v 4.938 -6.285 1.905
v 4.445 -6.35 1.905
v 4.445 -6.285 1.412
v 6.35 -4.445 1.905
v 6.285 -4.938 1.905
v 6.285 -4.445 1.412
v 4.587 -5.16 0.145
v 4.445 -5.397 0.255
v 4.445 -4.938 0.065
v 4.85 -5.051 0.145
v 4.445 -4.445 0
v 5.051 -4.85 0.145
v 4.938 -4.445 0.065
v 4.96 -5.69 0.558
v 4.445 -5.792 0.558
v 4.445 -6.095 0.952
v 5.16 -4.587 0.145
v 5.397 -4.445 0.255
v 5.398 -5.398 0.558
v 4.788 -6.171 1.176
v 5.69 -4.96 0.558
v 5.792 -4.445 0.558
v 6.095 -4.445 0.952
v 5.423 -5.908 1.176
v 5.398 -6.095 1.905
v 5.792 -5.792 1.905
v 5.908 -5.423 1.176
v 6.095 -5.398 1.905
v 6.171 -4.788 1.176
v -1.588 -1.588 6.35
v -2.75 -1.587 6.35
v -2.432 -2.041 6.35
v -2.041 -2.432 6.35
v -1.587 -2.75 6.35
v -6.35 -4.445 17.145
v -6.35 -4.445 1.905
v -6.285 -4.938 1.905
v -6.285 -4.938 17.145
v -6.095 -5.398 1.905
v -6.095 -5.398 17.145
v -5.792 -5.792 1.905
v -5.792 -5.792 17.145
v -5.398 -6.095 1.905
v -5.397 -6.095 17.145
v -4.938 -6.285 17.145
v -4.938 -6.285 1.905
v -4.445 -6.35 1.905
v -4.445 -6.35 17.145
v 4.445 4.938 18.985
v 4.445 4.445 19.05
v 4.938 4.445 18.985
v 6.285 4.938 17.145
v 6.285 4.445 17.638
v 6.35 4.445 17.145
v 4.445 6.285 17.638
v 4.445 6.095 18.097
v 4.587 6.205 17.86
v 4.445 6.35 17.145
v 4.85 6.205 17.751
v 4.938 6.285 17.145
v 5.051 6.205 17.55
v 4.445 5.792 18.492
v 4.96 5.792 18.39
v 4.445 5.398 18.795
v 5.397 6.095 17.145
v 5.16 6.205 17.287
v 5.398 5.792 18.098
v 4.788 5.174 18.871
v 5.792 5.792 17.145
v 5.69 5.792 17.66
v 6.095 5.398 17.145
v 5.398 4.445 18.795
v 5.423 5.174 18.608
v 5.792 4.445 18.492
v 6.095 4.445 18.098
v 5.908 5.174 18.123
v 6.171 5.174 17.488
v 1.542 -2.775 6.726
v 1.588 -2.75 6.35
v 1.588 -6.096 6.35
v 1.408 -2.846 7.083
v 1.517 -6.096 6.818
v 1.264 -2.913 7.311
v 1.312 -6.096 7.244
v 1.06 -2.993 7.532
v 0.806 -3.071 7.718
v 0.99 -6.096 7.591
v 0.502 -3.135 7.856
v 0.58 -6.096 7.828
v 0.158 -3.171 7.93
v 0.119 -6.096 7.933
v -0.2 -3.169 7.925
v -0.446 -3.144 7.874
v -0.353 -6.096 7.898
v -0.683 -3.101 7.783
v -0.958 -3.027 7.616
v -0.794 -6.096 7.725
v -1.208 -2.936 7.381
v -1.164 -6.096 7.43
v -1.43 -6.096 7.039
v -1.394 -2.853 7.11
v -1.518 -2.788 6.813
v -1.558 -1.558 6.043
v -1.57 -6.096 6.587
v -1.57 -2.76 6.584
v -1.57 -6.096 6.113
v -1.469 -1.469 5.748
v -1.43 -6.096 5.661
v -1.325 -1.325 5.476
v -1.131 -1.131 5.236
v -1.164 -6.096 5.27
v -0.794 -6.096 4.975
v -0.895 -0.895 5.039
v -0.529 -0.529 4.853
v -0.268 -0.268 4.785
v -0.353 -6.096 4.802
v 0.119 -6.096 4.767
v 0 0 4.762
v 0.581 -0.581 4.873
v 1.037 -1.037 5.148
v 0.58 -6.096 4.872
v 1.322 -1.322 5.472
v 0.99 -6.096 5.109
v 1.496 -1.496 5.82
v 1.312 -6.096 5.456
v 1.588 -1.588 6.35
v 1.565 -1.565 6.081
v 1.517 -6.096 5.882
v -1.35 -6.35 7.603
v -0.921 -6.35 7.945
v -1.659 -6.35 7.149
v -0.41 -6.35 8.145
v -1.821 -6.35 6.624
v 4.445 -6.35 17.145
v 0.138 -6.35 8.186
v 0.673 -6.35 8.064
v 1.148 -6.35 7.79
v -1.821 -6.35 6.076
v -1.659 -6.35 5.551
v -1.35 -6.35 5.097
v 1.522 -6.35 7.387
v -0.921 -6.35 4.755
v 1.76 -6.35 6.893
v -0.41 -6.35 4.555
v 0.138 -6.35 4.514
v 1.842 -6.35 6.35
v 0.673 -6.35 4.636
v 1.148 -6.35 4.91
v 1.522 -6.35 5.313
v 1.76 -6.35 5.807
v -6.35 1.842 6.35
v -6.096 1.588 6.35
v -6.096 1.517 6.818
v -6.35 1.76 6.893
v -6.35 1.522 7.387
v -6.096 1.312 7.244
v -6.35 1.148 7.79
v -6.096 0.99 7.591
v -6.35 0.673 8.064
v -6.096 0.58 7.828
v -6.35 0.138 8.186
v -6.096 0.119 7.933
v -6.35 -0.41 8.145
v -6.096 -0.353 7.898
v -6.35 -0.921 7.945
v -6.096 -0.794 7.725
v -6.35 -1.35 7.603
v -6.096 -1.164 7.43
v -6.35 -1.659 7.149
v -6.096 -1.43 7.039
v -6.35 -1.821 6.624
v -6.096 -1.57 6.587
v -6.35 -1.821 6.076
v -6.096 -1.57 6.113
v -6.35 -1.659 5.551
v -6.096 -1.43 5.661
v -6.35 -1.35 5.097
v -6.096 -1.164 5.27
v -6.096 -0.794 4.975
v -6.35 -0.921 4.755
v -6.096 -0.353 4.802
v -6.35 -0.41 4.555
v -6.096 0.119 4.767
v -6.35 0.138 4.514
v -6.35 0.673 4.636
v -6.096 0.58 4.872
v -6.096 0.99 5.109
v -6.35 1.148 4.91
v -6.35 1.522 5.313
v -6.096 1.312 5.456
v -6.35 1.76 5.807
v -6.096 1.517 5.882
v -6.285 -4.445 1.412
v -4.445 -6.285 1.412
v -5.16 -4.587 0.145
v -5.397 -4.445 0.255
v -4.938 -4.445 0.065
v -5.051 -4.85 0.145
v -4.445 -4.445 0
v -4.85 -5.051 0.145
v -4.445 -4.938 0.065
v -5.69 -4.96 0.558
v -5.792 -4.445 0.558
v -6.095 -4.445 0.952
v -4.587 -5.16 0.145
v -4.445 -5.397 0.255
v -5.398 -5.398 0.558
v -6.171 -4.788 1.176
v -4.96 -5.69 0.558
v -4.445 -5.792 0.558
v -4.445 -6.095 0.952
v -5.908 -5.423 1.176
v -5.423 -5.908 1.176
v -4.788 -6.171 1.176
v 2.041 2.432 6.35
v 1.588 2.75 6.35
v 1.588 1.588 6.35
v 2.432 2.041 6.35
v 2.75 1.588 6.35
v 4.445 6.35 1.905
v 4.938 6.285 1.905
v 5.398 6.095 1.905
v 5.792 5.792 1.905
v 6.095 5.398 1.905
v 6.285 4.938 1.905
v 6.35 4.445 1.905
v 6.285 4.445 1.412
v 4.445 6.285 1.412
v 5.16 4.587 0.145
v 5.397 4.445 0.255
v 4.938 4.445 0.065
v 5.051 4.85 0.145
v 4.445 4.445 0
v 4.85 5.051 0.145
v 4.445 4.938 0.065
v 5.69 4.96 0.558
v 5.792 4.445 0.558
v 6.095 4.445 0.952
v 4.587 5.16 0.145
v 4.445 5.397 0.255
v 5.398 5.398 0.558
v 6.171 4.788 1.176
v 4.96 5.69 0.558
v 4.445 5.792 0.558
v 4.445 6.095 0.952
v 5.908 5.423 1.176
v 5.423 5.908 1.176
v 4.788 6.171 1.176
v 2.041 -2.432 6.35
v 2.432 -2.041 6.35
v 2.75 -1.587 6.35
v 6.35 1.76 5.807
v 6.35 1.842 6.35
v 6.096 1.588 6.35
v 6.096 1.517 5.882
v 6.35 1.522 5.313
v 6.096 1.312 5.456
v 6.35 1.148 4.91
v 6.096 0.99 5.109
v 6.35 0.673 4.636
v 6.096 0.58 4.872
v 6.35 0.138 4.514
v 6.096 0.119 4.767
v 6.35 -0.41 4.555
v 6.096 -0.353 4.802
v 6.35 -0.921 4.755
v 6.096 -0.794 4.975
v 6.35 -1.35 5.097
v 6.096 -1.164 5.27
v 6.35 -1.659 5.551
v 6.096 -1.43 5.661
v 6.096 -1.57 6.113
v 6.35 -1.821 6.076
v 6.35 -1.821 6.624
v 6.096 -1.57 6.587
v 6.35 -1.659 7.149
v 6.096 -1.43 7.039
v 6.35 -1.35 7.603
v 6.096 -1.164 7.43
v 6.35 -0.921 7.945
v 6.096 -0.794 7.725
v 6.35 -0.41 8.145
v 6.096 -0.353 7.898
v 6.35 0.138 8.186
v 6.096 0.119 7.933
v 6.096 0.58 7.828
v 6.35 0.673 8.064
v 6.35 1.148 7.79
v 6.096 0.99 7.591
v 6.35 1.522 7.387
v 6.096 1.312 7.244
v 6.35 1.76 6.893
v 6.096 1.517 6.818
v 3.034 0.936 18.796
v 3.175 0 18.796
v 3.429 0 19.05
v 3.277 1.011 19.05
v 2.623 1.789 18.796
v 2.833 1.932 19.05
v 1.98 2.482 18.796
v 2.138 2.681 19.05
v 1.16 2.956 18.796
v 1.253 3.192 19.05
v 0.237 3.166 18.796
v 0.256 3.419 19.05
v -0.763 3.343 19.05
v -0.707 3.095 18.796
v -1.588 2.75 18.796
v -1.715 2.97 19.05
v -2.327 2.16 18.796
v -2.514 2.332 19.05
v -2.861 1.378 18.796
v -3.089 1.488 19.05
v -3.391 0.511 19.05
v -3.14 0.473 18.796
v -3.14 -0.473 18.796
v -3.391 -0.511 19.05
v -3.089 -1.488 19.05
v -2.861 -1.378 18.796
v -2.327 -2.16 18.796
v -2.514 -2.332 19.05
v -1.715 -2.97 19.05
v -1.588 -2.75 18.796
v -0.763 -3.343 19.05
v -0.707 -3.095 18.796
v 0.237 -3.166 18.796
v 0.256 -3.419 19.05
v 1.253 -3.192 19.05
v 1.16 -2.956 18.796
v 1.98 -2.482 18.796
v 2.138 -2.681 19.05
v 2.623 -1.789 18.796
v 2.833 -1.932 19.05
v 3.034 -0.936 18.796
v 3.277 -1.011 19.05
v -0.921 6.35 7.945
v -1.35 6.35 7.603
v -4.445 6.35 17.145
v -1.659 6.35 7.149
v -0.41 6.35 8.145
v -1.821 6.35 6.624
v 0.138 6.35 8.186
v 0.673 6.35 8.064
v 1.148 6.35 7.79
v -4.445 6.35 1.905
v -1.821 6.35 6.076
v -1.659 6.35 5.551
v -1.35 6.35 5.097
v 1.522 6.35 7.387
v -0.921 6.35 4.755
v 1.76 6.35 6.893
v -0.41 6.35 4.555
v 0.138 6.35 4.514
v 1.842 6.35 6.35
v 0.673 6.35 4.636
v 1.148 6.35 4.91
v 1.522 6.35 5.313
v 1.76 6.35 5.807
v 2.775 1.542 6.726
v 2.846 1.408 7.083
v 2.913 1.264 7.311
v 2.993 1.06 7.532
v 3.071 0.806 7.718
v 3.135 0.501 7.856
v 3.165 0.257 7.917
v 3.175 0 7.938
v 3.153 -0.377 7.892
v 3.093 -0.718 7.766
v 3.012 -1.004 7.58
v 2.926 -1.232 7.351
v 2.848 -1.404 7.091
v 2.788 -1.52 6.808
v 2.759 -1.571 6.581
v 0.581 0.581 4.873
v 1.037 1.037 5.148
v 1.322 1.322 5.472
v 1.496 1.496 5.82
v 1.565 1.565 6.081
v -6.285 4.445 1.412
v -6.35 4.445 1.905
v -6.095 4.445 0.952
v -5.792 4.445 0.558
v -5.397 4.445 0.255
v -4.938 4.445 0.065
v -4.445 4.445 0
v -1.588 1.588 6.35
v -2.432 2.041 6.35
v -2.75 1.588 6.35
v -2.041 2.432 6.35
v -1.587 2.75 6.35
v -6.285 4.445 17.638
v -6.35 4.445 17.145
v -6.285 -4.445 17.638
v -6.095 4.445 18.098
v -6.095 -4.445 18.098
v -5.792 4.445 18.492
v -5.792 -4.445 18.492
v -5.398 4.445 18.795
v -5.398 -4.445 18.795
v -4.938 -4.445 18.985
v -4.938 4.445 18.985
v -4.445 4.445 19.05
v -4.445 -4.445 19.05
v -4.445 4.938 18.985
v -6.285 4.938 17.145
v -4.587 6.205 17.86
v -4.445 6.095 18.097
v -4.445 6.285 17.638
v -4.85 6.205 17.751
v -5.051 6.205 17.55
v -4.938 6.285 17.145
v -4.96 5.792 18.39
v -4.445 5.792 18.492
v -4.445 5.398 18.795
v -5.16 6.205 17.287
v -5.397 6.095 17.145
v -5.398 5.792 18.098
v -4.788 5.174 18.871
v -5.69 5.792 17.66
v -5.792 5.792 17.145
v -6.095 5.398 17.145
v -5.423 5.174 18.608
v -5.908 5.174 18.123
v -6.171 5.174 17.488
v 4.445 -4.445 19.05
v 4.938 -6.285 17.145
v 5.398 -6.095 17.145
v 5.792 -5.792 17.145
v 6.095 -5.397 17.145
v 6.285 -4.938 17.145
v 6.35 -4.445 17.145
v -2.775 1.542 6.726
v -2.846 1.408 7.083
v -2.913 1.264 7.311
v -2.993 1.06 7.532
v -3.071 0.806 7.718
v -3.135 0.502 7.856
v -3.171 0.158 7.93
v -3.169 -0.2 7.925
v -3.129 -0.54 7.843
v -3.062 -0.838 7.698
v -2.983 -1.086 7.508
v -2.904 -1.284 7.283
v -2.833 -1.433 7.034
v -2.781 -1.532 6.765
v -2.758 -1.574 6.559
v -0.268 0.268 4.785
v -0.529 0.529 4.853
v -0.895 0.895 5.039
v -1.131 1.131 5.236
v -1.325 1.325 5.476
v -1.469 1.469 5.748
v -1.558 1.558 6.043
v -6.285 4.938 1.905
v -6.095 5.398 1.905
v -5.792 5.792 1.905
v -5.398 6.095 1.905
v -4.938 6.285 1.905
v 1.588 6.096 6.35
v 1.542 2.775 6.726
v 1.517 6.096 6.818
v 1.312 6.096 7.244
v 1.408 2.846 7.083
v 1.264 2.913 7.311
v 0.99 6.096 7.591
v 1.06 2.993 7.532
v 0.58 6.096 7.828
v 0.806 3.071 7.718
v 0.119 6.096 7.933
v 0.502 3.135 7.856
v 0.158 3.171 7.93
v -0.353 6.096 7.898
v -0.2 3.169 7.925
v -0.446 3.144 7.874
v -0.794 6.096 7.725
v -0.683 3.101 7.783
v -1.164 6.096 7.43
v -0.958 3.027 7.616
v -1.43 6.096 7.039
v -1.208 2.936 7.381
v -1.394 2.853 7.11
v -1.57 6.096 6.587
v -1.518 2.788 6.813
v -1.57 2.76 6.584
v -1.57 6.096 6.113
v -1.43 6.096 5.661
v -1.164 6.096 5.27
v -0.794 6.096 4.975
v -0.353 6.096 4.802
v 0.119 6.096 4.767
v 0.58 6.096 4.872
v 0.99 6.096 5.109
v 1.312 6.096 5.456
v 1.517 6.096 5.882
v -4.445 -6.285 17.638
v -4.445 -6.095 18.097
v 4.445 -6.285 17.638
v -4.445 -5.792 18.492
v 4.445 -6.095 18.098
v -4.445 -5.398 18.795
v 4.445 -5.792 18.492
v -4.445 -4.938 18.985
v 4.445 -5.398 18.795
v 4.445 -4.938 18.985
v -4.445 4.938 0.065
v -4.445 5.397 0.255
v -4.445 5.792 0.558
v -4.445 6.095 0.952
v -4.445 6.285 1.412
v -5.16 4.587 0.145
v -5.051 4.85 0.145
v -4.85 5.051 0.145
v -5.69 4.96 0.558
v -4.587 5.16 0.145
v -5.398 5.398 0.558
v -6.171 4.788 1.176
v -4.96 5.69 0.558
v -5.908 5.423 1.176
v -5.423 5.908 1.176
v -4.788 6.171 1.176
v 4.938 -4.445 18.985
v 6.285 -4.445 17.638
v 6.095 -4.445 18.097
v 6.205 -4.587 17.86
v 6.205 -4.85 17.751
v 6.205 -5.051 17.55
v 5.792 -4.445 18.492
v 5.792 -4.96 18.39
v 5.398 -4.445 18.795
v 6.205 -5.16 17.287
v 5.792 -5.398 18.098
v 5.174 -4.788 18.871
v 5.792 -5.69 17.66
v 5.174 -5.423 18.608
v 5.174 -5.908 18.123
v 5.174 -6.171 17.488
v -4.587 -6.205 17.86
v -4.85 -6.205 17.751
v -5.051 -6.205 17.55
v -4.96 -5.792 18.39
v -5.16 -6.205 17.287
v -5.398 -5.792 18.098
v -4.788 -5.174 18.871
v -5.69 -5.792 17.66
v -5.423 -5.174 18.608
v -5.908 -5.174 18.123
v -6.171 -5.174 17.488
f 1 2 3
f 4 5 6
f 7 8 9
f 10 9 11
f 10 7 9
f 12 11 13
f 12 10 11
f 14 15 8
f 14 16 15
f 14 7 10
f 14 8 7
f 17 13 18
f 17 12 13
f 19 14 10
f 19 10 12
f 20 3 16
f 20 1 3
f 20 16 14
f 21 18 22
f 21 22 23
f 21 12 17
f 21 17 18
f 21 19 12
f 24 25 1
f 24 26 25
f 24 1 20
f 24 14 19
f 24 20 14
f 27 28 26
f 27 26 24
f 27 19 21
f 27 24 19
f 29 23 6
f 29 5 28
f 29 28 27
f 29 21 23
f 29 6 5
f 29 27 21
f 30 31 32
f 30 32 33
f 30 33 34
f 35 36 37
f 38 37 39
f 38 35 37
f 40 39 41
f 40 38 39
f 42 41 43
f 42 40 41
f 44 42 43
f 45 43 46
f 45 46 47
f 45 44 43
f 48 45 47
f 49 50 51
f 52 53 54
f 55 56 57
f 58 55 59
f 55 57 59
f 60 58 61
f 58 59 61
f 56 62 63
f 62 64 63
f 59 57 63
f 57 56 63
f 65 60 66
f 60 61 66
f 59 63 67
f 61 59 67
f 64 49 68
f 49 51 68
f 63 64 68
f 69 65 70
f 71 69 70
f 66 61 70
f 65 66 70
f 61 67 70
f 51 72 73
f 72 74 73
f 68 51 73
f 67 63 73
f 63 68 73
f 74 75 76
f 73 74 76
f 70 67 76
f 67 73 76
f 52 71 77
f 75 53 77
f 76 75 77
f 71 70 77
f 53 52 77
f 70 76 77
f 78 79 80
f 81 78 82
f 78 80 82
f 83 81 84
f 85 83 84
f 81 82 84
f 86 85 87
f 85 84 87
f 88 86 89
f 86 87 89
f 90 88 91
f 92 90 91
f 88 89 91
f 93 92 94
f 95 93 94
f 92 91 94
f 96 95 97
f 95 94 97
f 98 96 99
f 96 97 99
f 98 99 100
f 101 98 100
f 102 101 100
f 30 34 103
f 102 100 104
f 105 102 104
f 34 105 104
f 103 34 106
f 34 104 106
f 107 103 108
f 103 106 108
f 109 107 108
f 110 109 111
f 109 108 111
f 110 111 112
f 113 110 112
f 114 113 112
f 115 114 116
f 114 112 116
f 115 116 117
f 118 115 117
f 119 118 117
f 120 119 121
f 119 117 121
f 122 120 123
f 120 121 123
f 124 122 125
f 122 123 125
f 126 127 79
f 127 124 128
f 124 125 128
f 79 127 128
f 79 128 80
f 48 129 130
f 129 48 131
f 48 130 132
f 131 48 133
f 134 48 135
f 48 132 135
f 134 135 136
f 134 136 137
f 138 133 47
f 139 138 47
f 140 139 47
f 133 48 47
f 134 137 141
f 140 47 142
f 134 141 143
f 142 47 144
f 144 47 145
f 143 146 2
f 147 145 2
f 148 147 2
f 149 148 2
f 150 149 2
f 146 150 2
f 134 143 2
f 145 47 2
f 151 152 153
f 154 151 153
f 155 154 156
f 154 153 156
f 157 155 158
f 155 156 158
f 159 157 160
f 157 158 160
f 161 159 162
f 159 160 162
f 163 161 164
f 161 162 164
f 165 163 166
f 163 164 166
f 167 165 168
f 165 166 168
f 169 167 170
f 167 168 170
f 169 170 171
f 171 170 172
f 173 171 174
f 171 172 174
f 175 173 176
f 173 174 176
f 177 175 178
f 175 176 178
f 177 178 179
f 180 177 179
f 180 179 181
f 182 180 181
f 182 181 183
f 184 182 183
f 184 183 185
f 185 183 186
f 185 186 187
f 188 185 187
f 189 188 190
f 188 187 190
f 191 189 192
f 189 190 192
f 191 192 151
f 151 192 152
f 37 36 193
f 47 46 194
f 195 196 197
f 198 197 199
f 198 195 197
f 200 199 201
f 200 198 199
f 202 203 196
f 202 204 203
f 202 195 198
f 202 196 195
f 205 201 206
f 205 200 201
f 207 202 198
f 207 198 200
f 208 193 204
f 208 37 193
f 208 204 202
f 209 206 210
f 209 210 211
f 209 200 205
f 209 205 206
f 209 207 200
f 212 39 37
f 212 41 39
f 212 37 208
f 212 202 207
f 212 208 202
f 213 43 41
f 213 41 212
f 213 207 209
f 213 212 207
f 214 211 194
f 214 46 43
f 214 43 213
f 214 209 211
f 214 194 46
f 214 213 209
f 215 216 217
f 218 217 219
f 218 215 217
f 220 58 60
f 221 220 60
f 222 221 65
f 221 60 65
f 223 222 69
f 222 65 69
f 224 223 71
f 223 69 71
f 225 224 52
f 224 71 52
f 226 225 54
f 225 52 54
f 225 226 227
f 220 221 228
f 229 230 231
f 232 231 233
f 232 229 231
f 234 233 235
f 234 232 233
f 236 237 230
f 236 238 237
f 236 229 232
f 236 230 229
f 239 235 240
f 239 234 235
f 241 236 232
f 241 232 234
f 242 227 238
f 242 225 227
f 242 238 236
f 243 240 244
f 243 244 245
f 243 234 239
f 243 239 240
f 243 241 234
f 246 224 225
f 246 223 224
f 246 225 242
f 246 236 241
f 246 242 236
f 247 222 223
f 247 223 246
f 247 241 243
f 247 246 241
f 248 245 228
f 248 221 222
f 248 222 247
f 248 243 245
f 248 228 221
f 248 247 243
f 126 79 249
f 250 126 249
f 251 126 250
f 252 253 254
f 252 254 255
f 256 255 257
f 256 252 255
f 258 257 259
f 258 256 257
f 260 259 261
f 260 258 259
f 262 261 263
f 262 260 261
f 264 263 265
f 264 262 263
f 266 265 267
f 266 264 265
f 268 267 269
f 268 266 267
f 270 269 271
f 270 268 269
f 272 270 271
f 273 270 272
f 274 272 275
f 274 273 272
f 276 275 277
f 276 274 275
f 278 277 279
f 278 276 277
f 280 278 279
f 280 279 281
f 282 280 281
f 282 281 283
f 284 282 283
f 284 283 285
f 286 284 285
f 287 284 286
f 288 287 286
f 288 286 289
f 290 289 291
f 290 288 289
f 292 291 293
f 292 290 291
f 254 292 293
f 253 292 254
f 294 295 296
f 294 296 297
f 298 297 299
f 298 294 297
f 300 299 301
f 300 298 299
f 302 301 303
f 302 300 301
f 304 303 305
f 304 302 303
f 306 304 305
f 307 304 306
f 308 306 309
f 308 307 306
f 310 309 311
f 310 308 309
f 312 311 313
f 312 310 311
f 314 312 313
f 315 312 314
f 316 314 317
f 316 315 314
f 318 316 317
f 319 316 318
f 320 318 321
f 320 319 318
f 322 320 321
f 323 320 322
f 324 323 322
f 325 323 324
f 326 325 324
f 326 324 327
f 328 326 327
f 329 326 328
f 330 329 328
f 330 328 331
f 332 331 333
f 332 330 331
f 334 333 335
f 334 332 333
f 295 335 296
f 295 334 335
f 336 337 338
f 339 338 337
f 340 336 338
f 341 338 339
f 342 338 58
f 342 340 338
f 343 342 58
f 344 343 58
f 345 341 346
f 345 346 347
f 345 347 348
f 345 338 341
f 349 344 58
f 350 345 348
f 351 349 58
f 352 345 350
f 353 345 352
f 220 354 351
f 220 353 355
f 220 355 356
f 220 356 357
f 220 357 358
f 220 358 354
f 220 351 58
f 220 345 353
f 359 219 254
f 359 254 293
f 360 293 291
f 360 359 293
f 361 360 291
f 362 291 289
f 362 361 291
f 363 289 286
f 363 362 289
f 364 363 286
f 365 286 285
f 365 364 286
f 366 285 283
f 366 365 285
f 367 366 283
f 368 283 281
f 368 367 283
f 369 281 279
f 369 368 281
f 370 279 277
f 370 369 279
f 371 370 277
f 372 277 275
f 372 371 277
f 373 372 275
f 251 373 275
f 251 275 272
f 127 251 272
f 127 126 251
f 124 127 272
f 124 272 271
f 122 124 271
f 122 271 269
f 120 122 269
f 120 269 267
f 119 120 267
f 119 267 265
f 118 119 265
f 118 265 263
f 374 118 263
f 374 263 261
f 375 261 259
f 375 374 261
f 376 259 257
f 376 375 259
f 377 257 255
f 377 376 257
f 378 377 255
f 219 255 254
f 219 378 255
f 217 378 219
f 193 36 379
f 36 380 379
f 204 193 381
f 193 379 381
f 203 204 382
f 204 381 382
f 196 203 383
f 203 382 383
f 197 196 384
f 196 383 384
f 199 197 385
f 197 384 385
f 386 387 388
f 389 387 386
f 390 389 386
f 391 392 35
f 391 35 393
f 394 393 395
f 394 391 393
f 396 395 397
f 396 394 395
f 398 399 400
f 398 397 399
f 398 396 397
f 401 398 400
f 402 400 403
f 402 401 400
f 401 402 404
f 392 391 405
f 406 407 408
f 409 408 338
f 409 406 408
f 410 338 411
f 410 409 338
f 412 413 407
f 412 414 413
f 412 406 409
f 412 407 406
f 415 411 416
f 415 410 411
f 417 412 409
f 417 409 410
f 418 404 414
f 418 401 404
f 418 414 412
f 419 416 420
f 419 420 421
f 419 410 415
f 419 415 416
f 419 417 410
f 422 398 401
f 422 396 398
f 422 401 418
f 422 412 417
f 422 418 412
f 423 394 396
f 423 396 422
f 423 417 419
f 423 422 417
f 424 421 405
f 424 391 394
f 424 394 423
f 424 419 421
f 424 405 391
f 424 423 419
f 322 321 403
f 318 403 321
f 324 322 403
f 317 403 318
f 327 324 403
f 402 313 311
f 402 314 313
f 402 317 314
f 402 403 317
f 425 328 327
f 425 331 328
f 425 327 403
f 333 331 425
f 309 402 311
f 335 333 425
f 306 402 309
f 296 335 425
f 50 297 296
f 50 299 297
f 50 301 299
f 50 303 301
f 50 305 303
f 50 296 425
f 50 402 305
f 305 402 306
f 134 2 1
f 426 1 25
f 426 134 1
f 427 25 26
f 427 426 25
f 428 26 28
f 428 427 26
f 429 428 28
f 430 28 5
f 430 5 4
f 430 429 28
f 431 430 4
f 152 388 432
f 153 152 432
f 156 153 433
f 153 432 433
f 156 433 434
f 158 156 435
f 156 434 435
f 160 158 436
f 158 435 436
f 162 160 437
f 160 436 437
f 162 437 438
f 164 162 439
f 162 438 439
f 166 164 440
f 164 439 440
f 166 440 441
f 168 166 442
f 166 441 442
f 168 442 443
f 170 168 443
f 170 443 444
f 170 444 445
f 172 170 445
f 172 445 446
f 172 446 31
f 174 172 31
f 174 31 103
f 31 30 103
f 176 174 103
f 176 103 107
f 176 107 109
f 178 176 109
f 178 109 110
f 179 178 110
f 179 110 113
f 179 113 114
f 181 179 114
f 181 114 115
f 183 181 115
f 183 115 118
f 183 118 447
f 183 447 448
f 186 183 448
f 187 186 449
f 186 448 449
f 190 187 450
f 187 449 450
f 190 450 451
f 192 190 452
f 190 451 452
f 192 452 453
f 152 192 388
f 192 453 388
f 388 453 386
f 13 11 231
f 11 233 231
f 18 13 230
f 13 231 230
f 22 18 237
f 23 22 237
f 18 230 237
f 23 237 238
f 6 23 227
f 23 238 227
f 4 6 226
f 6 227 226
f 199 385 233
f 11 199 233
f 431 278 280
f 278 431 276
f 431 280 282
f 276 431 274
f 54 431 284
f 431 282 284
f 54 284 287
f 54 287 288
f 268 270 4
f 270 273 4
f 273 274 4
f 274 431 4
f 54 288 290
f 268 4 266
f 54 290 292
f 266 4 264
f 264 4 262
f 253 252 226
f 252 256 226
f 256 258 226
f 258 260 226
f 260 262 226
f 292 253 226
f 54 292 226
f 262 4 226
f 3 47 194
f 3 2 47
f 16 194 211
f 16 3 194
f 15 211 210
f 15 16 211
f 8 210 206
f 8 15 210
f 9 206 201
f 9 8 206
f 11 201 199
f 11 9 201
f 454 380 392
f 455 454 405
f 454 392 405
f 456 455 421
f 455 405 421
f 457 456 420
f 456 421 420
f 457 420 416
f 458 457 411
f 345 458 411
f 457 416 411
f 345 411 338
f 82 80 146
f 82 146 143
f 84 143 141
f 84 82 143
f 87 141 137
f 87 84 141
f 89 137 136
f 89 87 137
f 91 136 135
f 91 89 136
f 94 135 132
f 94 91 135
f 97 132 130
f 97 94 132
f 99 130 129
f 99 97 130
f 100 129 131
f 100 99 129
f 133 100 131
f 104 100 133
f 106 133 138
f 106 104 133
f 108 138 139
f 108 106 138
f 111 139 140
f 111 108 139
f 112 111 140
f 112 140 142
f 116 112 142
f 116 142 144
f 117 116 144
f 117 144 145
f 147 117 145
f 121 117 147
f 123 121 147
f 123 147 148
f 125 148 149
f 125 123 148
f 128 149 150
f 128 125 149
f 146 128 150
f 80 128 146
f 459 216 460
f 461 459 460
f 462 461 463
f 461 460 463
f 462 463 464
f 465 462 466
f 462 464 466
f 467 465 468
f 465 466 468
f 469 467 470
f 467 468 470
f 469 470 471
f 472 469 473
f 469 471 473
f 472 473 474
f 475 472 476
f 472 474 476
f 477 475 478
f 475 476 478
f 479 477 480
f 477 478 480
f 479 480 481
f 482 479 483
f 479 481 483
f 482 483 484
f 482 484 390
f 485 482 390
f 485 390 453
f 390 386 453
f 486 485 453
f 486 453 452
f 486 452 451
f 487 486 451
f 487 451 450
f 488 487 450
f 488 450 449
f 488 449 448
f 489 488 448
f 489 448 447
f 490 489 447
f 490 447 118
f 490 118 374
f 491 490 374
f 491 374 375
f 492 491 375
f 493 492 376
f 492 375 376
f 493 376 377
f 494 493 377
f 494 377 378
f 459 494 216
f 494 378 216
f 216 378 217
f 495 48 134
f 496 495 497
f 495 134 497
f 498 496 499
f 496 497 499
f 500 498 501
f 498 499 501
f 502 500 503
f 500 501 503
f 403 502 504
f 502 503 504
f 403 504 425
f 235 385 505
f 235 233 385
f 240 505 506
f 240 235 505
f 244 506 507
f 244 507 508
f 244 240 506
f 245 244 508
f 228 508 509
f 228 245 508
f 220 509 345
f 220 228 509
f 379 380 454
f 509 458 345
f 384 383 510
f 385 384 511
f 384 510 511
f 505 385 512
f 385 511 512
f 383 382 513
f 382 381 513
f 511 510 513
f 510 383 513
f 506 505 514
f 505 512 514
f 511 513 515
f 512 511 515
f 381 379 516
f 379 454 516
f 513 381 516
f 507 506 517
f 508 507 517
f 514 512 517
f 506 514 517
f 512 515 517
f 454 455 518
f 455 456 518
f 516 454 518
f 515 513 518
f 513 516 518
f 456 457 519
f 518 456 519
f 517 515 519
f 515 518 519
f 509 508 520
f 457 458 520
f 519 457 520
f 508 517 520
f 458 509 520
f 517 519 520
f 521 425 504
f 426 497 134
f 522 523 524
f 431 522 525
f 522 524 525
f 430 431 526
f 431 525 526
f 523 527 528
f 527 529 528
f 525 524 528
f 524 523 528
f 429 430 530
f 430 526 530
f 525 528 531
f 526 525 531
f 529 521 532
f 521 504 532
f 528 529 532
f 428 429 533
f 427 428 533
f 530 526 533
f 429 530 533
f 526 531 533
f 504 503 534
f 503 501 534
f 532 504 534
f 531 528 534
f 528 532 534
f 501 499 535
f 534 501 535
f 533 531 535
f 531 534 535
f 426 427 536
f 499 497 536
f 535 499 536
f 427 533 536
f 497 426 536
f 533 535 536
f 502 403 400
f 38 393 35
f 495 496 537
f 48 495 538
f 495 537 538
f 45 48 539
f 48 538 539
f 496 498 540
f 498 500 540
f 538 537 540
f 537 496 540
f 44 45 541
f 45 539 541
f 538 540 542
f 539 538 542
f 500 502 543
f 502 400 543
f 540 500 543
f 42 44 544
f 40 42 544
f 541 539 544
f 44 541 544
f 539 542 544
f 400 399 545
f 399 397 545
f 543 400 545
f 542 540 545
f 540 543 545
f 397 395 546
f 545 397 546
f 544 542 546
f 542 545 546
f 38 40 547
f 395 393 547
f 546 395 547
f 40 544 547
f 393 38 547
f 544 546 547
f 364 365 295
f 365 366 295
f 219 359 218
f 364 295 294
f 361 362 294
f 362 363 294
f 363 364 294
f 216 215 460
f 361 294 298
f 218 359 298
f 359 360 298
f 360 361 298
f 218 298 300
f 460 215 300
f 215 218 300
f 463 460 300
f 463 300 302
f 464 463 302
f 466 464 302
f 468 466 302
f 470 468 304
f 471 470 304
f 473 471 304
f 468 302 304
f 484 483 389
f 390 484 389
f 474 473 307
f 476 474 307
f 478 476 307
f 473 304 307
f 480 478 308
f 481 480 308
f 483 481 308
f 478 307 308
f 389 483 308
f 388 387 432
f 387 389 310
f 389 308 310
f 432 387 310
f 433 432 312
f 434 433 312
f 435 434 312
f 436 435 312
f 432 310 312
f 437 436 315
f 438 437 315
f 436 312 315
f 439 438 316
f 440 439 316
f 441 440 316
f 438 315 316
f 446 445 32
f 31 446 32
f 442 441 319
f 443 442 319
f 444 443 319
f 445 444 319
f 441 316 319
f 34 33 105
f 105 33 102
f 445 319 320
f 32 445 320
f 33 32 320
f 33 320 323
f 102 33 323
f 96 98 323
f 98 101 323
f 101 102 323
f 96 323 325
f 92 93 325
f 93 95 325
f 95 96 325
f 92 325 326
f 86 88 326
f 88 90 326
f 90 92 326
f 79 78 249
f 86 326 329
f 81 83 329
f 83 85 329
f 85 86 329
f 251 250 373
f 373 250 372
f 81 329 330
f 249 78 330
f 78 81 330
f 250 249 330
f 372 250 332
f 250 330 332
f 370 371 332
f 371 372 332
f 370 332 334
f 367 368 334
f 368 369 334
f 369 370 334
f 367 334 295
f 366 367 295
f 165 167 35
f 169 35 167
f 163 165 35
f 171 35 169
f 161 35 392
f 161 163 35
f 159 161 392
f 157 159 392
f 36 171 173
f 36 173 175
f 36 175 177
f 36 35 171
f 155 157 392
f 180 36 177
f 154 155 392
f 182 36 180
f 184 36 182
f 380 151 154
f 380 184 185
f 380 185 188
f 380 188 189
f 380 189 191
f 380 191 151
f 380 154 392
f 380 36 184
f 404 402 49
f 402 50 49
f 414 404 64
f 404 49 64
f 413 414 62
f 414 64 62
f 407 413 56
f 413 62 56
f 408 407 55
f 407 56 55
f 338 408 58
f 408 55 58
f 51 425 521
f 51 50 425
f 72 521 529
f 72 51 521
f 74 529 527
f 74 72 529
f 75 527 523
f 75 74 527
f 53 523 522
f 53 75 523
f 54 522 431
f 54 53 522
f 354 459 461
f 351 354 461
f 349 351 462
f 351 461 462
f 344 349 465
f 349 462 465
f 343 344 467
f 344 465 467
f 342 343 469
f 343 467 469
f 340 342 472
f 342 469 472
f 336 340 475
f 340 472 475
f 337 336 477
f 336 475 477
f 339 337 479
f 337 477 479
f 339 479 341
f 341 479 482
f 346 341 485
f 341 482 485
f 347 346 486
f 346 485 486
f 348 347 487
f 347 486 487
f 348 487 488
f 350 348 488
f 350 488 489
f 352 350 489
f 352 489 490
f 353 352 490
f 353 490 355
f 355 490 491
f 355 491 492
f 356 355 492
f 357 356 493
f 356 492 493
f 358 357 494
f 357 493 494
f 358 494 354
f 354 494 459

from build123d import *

# Parameters (mm, degrees)
F0_W          = 12.7
F0_H          = 12.7
F1_DEPTH      = 19.05
F2_R          = 1.5875
F3_DEPTH      = 25.4
F4_R          = 1.5875
F5_DEPTH      = 6.351
F5_DEPTH_BACK = 6.351
F6_R          = 3.175
F7_DEPTH      = 12.7
F8_R          = 1.905
F9_SIZE       = 0.254


with BuildPart() as f1:
    # F0 (on Top) → F1 (new body)
    with BuildSketch(Plane.XY):
        Rectangle(F0_W, F0_H)
    extrude(amount=F1_DEPTH)

    # F2 (on face) → F3 (cut)
    with BuildSketch(Plane.XZ.offset(6.35)):
        with Locations((0, 6.35)):
            Circle(F2_R)
    extrude(amount=-F3_DEPTH, mode=Mode.SUBTRACT)

    # F4 (on Right) → F5 (cut, two sides)
    with BuildSketch(Plane.YZ) as f5_sk:
        with Locations((0, 6.35)):
            Circle(F4_R)
    extrude(amount=-F5_DEPTH, mode=Mode.SUBTRACT)
    extrude(f5_sk.sketch, amount=F5_DEPTH_BACK, mode=Mode.SUBTRACT)

    # F6 (on face) → F7 (cut)
    with BuildSketch(Plane.XY.offset(19.05)):
        Circle(F6_R)
    extrude(amount=-F7_DEPTH, mode=Mode.SUBTRACT)

    # F8
    f8_edges = [f1.edges().sort_by_distance(p)[0] for p in [
        (-6.35, 0, 19.05),
        (0, -6.35, 19.05),
        (6.35, 0, 19.05),
        (0, 6.35, 19.05),
        (6.35, -6.35, 9.525),
        (6.35, 6.35, 9.525),
        (-6.35, -6.35, 9.525),
        (-6.35, 6.35, 9.525),
        (-6.35, 0, 0),
        (0, -6.35, 0),
        (6.35, 0, 0),
        (0, 6.35, 0),
    ]]
    fillet(f8_edges, radius=F8_R)

    # F9
    f9_edges = [f1.edges().sort_by_distance(p)[0] for p in [
        (6.35, -1.5875, 6.35),
        (-3.175, 0, 19.05),
        (-1.5875, 6.35, 6.35),
        (-6.35, -1.5875, 6.35),
        (-1.5875, -6.35, 6.35),
    ]]
    chamfer(f9_edges, length=F9_SIZE)


solid = f1.part
